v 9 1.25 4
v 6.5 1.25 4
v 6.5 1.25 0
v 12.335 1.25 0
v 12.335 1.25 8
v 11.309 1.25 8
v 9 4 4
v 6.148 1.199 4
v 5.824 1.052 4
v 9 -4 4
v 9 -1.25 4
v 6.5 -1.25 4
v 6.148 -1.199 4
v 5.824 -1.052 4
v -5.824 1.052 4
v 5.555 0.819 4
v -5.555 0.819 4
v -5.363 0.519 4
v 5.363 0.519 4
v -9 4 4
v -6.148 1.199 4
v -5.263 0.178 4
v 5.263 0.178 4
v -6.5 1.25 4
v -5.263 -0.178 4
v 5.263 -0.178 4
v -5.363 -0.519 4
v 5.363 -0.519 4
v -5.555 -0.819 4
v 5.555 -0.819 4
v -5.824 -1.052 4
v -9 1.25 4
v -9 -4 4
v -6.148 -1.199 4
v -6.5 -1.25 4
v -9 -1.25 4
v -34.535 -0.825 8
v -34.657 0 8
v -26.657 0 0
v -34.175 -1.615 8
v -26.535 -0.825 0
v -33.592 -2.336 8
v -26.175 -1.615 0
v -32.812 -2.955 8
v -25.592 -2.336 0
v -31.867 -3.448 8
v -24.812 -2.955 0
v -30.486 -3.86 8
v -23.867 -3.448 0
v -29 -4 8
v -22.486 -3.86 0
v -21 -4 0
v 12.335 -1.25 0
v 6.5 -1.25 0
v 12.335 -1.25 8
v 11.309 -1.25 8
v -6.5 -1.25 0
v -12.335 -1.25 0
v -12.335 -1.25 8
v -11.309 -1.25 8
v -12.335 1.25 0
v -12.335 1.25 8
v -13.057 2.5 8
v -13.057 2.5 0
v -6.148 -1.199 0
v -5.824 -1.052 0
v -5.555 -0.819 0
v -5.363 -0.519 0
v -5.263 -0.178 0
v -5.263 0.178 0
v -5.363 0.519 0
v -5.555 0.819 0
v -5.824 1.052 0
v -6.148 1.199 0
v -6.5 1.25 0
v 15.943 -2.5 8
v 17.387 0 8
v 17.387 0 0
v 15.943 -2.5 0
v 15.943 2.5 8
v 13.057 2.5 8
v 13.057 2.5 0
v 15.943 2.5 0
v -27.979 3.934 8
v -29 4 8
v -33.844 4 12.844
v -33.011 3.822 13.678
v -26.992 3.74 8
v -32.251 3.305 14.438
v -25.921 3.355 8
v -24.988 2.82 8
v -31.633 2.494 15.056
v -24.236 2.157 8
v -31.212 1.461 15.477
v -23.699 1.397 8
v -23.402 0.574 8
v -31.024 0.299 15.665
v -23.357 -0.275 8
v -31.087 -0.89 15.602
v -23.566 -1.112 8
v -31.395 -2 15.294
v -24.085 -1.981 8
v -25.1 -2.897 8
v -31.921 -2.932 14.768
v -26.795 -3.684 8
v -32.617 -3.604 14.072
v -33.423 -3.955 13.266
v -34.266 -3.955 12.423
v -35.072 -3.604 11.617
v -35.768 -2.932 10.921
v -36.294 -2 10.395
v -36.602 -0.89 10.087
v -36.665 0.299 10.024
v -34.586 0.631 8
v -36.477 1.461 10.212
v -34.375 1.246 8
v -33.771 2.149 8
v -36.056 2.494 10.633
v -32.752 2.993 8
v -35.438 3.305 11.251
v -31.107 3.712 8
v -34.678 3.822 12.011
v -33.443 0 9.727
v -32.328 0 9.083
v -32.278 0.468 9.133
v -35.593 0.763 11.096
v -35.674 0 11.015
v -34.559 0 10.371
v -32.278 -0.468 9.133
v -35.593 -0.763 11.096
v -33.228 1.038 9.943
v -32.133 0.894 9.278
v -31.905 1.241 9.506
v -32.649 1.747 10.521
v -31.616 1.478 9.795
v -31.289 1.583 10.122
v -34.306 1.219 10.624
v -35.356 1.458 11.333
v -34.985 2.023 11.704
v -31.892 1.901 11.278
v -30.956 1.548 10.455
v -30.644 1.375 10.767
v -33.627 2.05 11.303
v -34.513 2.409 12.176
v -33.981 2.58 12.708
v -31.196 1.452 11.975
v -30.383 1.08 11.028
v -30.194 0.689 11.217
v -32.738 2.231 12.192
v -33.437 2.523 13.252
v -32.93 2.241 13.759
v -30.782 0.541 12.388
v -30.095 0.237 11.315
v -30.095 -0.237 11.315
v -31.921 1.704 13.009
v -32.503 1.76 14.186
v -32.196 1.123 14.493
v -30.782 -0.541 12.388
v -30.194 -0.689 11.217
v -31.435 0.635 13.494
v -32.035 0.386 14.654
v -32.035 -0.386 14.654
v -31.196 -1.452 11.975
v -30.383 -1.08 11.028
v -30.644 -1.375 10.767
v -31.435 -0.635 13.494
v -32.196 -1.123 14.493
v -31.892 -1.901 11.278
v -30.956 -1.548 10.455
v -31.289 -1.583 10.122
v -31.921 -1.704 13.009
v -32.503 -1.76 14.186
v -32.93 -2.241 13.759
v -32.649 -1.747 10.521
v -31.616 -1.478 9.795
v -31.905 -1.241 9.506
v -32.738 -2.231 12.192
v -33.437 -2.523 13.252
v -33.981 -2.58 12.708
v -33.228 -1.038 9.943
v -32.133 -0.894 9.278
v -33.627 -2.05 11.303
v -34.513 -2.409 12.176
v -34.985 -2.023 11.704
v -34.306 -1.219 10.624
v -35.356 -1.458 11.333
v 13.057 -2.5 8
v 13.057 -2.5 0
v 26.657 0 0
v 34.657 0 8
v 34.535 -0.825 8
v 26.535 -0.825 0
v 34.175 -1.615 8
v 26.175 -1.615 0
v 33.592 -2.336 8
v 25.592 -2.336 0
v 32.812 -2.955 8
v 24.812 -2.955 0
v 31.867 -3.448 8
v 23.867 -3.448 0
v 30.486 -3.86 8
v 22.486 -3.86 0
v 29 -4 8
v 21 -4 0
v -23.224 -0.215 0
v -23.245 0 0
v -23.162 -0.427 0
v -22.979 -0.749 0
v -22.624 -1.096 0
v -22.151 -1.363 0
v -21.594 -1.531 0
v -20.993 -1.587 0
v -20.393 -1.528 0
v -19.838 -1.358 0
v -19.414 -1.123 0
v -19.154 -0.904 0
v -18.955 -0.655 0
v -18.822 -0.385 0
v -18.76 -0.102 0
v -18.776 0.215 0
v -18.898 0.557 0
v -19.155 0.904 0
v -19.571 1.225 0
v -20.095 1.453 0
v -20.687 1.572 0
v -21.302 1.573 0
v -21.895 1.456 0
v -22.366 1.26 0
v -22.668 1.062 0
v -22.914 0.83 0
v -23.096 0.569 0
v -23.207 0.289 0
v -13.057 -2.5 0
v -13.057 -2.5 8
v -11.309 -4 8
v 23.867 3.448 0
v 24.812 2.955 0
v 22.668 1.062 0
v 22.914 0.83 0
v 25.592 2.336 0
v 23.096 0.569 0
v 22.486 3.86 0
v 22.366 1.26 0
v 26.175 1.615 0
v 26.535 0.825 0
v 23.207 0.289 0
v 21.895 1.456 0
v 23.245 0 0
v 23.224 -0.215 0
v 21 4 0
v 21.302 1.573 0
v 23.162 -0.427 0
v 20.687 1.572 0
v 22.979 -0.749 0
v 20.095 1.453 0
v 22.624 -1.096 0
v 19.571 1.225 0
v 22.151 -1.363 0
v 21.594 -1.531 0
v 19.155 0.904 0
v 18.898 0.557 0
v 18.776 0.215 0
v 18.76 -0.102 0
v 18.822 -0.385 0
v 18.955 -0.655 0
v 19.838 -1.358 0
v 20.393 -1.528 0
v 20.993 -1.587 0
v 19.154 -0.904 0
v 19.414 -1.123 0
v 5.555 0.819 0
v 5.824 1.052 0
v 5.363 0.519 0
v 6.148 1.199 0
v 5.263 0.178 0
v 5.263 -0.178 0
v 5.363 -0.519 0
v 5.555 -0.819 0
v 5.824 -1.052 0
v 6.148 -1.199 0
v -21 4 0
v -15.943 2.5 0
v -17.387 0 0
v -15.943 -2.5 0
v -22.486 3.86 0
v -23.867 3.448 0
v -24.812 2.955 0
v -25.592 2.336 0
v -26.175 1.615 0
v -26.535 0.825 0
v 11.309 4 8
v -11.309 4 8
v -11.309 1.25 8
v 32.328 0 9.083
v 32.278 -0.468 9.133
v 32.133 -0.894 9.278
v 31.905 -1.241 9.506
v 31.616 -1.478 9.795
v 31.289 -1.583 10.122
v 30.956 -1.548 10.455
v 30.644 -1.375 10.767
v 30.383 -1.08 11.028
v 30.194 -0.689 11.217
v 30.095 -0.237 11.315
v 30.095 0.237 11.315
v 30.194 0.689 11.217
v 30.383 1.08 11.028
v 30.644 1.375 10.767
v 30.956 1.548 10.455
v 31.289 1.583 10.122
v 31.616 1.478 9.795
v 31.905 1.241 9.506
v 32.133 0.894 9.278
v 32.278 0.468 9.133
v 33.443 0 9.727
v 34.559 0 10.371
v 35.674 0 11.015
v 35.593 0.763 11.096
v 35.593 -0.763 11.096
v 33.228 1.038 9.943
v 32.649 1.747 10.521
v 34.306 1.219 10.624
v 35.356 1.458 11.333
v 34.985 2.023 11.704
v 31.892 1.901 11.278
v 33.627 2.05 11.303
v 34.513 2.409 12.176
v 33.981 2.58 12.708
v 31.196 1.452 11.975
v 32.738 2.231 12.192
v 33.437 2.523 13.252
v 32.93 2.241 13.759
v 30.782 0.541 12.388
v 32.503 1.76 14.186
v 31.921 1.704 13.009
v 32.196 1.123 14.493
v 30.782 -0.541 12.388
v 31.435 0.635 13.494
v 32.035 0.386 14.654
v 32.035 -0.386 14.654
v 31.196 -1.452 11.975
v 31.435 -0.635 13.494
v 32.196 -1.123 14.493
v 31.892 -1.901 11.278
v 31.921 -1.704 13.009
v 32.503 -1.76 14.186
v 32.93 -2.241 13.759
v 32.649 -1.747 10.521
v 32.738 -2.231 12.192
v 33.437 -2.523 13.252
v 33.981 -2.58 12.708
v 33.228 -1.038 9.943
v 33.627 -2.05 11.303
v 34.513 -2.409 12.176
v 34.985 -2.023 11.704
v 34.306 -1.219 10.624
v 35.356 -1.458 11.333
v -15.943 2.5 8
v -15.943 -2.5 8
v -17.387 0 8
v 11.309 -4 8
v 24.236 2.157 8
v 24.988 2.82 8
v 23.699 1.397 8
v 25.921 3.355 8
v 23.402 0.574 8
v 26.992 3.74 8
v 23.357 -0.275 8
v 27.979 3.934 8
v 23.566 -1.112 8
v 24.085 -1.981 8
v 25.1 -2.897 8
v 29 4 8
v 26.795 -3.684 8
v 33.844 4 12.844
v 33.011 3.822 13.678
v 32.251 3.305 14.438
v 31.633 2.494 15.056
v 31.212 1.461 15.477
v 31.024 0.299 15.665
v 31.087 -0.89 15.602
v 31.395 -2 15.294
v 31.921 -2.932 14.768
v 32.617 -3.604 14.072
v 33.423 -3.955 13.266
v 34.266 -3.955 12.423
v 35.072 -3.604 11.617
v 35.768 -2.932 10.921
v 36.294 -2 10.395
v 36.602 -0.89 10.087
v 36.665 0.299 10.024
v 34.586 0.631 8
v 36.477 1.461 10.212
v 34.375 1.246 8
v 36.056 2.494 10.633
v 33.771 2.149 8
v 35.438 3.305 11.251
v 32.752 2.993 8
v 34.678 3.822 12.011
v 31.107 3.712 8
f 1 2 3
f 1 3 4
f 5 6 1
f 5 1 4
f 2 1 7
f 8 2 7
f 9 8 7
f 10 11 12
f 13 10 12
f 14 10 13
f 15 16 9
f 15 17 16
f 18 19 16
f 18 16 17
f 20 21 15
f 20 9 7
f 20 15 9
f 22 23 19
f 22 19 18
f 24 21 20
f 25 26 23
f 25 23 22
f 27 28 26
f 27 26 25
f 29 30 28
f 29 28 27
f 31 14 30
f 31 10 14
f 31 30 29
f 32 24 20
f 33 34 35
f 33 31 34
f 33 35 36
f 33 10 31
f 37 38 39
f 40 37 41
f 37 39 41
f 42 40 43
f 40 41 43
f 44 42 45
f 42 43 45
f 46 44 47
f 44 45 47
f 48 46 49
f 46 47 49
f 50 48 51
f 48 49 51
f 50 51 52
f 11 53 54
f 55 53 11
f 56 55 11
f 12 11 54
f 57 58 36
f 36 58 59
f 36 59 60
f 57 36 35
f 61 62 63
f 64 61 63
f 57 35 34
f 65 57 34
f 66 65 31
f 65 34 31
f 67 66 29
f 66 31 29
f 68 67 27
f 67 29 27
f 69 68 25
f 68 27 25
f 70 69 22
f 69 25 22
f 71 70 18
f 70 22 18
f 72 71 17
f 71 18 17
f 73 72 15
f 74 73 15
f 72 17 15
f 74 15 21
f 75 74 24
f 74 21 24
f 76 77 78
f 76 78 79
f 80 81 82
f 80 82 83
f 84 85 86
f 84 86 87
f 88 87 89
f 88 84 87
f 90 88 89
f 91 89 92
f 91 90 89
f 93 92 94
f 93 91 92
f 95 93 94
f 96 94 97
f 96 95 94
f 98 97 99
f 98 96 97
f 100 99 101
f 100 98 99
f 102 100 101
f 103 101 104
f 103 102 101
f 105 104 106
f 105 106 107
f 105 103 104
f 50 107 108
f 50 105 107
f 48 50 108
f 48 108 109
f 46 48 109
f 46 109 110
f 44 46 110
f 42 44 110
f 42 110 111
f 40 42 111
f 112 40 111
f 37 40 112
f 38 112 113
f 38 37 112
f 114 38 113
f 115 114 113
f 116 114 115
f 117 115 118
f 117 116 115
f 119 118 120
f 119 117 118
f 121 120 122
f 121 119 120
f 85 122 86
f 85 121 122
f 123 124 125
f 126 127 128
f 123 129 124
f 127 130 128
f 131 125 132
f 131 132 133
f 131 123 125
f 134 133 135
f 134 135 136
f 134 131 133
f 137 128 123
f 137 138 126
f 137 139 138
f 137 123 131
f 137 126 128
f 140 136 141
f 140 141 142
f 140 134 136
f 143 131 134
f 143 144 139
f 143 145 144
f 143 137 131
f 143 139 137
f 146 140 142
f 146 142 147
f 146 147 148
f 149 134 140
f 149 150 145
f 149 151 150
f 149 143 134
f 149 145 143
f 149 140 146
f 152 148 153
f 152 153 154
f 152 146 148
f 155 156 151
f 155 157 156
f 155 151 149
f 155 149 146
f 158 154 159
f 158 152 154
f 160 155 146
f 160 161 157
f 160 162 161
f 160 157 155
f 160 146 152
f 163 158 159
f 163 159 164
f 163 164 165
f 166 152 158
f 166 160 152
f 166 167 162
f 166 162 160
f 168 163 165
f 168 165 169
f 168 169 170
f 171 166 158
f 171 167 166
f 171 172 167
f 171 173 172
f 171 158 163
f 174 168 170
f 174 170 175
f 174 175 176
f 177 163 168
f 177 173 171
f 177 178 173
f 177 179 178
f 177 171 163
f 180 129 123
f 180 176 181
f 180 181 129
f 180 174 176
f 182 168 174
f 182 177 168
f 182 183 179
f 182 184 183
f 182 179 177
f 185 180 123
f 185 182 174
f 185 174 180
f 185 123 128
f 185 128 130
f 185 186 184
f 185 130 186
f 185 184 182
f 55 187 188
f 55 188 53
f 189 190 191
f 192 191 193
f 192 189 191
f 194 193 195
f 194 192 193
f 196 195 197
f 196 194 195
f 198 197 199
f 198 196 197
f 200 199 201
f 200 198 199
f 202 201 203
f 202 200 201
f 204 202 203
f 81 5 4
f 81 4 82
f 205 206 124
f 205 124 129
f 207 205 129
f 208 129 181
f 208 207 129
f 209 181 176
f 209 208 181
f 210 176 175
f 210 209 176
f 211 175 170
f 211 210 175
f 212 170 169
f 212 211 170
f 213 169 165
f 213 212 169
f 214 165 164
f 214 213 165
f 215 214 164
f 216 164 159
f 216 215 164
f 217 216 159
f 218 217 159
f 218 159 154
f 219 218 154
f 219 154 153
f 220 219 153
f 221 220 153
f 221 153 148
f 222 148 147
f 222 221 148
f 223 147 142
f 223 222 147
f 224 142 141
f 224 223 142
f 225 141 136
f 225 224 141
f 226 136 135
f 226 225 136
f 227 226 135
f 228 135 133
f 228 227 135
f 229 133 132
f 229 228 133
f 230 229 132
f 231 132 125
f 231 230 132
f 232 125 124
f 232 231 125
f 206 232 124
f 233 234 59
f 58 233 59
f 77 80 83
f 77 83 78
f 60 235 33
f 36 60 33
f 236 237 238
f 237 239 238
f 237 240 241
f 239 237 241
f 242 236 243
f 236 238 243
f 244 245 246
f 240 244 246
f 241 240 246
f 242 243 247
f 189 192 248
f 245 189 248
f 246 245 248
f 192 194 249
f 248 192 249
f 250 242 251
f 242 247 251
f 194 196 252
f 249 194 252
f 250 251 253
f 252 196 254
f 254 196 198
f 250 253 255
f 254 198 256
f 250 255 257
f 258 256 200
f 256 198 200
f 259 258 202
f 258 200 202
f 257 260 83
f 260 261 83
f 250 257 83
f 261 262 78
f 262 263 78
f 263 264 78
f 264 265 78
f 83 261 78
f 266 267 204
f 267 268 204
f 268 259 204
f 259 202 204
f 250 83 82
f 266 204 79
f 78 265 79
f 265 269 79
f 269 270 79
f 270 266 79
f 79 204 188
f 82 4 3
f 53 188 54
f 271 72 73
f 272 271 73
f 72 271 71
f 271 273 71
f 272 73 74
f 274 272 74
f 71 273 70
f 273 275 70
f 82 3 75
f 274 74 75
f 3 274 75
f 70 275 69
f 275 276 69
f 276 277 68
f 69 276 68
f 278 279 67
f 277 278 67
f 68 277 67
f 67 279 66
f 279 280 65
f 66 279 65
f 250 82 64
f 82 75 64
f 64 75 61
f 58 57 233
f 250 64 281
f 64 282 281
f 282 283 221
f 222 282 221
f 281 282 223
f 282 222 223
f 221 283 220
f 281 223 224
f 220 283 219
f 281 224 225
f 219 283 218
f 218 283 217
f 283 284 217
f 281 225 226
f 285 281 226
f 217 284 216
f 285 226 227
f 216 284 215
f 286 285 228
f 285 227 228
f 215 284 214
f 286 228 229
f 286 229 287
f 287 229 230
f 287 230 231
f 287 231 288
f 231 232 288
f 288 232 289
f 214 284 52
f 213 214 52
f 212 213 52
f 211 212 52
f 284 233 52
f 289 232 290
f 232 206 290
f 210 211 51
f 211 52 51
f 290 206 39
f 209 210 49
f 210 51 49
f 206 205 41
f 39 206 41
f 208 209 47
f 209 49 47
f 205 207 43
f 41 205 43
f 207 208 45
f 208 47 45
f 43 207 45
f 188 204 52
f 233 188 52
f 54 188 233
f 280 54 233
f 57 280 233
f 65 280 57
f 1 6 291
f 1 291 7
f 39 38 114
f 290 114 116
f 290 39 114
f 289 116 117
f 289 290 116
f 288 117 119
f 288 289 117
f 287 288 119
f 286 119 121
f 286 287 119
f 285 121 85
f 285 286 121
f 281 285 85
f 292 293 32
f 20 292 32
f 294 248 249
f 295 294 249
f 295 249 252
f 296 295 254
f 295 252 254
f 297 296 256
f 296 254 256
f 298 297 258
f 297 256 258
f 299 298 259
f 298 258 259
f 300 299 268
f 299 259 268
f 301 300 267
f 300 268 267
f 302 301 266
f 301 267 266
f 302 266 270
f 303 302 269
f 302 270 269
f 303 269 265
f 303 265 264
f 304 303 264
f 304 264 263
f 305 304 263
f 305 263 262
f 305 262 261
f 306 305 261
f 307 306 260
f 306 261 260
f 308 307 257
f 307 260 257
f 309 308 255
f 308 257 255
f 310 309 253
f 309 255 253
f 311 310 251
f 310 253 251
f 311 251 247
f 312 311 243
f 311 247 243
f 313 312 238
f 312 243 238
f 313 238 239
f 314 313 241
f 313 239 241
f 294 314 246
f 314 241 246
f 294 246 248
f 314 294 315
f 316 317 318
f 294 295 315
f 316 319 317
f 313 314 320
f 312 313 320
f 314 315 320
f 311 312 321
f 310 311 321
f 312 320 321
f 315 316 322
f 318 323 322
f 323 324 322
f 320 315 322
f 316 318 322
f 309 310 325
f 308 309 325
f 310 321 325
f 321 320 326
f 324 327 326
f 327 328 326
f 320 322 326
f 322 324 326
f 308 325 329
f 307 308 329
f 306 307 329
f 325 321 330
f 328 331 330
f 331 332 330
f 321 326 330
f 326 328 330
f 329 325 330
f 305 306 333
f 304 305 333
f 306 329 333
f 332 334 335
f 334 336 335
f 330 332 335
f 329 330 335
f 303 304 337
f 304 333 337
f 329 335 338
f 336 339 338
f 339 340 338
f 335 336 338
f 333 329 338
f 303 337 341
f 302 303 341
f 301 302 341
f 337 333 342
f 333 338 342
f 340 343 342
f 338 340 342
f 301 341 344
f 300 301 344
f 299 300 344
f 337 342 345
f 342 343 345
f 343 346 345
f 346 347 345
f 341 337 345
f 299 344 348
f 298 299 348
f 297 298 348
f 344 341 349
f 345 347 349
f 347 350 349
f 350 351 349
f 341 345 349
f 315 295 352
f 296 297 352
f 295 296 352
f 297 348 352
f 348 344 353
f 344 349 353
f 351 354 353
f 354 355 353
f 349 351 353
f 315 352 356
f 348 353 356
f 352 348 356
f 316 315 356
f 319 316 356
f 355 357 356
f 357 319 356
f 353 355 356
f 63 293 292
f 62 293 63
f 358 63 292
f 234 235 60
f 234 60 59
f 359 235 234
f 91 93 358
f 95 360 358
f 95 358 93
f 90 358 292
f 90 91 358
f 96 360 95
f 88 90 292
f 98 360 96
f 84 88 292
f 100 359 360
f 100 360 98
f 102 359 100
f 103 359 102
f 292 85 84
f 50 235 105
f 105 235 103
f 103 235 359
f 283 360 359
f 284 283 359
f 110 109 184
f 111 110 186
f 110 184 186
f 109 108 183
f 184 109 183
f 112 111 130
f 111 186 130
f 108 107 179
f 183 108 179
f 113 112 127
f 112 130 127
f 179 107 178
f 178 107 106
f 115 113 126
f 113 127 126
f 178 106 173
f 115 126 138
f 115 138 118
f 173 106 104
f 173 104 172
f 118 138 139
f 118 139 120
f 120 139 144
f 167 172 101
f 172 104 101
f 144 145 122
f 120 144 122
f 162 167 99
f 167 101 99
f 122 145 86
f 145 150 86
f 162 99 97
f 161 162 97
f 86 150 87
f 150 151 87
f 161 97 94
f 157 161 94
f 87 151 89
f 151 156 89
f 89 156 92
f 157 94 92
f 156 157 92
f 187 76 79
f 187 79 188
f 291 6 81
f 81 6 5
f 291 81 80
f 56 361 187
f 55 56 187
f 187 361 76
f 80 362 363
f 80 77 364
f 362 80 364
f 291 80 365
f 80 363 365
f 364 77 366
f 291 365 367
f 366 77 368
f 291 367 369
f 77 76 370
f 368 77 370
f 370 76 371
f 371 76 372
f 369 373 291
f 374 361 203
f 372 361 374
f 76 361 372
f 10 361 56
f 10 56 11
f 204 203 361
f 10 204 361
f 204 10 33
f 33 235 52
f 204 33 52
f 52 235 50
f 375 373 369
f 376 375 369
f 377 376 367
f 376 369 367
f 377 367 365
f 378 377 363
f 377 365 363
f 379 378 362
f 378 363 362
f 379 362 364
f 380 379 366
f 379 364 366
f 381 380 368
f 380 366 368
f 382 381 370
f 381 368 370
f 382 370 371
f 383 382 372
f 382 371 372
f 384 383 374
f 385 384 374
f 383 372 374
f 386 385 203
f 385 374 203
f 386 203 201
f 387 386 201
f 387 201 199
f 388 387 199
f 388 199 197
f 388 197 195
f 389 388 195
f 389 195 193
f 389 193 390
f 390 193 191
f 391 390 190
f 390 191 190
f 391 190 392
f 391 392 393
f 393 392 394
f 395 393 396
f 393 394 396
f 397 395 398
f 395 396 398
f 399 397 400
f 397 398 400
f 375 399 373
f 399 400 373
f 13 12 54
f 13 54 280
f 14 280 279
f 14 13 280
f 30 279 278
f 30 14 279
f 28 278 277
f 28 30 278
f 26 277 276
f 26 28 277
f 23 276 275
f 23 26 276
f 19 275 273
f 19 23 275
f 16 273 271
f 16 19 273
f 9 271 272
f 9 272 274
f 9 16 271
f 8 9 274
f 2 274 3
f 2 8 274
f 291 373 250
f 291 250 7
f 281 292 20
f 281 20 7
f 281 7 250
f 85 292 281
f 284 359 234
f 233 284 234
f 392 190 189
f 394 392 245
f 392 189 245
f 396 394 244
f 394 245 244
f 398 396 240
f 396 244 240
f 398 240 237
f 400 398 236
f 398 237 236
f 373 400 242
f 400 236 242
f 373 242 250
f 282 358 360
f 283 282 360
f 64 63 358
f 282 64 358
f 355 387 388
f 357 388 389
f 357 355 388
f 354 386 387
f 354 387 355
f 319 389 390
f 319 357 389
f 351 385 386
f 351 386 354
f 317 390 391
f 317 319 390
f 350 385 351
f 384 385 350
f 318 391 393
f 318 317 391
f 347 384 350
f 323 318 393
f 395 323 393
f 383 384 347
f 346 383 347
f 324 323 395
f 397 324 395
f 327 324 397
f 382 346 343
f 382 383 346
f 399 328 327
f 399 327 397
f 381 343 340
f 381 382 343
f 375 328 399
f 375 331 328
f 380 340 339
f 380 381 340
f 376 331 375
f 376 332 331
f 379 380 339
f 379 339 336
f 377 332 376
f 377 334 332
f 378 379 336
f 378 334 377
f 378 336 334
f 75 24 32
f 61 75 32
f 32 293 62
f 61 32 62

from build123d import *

# Parameters (mm, degrees)
F1_DEPTH  = 4
F2_R      = 3.99999
F4_DEPTH  = 8
F6_DEPTH  = 12.5
F9_R      = 4
F10_DEPTH = 6.851053331
F12_SIZE2 = 1
F12_SIZE  = 3.7320508076
F14_DEPTH = 8.001


# Not quite as in the source:
# - a fillet or chamfer is up to 0.001 mm smaller than in the source, because OpenCascade refuses the exact size


with BuildPart() as f1:
    # F0 (on Front) → F1 (new body, symmetric)
    with BuildSketch(Plane.XZ):
        Polygon((-26.6568542495, 0), (0, 0), (0, 8), (-34.6568542495, 8), align=None)
    extrude(amount=F1_DEPTH, both=True)

    # F2 (radius 4 in the source; OpenCascade refuses exactly that, so slightly less here)
    f2_edges = [f1.edges().sort_by_distance(p)[0] for p in [
        (-30.656854, 4, 4),
        (-30.656854, -4, 4),
    ]]
    fillet(f2_edges, radius=F2_R)

    # F3 (on face) → F4 (cut, through all)
    with BuildSketch(Plane.XY.offset(8)):
        Polygon((-11.6132486541, 0), (-13.056624327, 2.5), (-15.943375673, 2.5), (-17.3867513459, 0), (-15.943375673, -2.5), (-13.056624327, -2.5), align=None)
    extrude(amount=-F4_DEPTH, mode=Mode.SUBTRACT)

    # F5 (on Front) → F6 (cut, symmetric)
    with BuildSketch(Plane.XZ):
        Polygon((0, 4), (0, 11.6737775235), (-13.4304575189, 11.6737775235), (-9, 4), align=None)
    extrude(amount=F6_DEPTH, both=True, mode=Mode.SUBTRACT)

    # F9 (on line) → F10 (join, symmetric)
    with BuildSketch(Plane(origin=(-18.5, 0, 18.5), x_dir=(0, 1, 0), z_dir=(0.7071067812, 0, -0.7071067812))):
        with Locations((0, -14.8492424049)):
            Circle(F9_R)
    extrude(amount=F10_DEPTH, both=True)

    # F7 (on Front) → F11 (revolve, cut)
    with BuildSketch(Plane.XZ):
        Polygon((-11.4302859145, -11.8147781158), (-10.3077538993, -10.6922461007), (-44.6173825807, 23.6173825807), (-45.7399145958, 22.4948505656), align=None)
    revolve(axis=Axis((-27.46256824, 0, 6.46256824), (-0.7071067812, 0, 0.7071067812)), mode=Mode.SUBTRACT)

    # F12
    f12_edges = [f1.edges().sort_by_distance(p)[0] for p in [
        (-32.721894, 0, 13.966958),
    ]]
    f12_side = f1.faces().sort_by_distance((-25.685621, 0, 6.930685))[0]
    chamfer(f12_edges, length=F12_SIZE, length2=F12_SIZE2, reference=f12_side)

    # F13 (on face) → F14 (cut, through all)
    with BuildSketch(Plane.XY.offset(8)):
        with BuildLine():
            ThreePointArc((-14.5, 1.25), (-15.75, 0), (-14.5, -1.25))
            Line((-14.5, -1.25), (-6.5, -1.25))
            ThreePointArc((-6.5, -1.25), (-5.25, 0), (-6.5, 1.25))
            Line((-6.5, 1.25), (-14.5, 1.25))
        make_face()
    extrude(amount=-F14_DEPTH, mode=Mode.SUBTRACT)

    # F15: F1 across face


with BuildPart() as f1_1:
    add(f1.part)
    add(f1.part.mirror(Plane(origin=(0, 0, 2), x_dir=(0, 1, 0), z_dir=(1, 0, 0))))


solid = f1_1.part
